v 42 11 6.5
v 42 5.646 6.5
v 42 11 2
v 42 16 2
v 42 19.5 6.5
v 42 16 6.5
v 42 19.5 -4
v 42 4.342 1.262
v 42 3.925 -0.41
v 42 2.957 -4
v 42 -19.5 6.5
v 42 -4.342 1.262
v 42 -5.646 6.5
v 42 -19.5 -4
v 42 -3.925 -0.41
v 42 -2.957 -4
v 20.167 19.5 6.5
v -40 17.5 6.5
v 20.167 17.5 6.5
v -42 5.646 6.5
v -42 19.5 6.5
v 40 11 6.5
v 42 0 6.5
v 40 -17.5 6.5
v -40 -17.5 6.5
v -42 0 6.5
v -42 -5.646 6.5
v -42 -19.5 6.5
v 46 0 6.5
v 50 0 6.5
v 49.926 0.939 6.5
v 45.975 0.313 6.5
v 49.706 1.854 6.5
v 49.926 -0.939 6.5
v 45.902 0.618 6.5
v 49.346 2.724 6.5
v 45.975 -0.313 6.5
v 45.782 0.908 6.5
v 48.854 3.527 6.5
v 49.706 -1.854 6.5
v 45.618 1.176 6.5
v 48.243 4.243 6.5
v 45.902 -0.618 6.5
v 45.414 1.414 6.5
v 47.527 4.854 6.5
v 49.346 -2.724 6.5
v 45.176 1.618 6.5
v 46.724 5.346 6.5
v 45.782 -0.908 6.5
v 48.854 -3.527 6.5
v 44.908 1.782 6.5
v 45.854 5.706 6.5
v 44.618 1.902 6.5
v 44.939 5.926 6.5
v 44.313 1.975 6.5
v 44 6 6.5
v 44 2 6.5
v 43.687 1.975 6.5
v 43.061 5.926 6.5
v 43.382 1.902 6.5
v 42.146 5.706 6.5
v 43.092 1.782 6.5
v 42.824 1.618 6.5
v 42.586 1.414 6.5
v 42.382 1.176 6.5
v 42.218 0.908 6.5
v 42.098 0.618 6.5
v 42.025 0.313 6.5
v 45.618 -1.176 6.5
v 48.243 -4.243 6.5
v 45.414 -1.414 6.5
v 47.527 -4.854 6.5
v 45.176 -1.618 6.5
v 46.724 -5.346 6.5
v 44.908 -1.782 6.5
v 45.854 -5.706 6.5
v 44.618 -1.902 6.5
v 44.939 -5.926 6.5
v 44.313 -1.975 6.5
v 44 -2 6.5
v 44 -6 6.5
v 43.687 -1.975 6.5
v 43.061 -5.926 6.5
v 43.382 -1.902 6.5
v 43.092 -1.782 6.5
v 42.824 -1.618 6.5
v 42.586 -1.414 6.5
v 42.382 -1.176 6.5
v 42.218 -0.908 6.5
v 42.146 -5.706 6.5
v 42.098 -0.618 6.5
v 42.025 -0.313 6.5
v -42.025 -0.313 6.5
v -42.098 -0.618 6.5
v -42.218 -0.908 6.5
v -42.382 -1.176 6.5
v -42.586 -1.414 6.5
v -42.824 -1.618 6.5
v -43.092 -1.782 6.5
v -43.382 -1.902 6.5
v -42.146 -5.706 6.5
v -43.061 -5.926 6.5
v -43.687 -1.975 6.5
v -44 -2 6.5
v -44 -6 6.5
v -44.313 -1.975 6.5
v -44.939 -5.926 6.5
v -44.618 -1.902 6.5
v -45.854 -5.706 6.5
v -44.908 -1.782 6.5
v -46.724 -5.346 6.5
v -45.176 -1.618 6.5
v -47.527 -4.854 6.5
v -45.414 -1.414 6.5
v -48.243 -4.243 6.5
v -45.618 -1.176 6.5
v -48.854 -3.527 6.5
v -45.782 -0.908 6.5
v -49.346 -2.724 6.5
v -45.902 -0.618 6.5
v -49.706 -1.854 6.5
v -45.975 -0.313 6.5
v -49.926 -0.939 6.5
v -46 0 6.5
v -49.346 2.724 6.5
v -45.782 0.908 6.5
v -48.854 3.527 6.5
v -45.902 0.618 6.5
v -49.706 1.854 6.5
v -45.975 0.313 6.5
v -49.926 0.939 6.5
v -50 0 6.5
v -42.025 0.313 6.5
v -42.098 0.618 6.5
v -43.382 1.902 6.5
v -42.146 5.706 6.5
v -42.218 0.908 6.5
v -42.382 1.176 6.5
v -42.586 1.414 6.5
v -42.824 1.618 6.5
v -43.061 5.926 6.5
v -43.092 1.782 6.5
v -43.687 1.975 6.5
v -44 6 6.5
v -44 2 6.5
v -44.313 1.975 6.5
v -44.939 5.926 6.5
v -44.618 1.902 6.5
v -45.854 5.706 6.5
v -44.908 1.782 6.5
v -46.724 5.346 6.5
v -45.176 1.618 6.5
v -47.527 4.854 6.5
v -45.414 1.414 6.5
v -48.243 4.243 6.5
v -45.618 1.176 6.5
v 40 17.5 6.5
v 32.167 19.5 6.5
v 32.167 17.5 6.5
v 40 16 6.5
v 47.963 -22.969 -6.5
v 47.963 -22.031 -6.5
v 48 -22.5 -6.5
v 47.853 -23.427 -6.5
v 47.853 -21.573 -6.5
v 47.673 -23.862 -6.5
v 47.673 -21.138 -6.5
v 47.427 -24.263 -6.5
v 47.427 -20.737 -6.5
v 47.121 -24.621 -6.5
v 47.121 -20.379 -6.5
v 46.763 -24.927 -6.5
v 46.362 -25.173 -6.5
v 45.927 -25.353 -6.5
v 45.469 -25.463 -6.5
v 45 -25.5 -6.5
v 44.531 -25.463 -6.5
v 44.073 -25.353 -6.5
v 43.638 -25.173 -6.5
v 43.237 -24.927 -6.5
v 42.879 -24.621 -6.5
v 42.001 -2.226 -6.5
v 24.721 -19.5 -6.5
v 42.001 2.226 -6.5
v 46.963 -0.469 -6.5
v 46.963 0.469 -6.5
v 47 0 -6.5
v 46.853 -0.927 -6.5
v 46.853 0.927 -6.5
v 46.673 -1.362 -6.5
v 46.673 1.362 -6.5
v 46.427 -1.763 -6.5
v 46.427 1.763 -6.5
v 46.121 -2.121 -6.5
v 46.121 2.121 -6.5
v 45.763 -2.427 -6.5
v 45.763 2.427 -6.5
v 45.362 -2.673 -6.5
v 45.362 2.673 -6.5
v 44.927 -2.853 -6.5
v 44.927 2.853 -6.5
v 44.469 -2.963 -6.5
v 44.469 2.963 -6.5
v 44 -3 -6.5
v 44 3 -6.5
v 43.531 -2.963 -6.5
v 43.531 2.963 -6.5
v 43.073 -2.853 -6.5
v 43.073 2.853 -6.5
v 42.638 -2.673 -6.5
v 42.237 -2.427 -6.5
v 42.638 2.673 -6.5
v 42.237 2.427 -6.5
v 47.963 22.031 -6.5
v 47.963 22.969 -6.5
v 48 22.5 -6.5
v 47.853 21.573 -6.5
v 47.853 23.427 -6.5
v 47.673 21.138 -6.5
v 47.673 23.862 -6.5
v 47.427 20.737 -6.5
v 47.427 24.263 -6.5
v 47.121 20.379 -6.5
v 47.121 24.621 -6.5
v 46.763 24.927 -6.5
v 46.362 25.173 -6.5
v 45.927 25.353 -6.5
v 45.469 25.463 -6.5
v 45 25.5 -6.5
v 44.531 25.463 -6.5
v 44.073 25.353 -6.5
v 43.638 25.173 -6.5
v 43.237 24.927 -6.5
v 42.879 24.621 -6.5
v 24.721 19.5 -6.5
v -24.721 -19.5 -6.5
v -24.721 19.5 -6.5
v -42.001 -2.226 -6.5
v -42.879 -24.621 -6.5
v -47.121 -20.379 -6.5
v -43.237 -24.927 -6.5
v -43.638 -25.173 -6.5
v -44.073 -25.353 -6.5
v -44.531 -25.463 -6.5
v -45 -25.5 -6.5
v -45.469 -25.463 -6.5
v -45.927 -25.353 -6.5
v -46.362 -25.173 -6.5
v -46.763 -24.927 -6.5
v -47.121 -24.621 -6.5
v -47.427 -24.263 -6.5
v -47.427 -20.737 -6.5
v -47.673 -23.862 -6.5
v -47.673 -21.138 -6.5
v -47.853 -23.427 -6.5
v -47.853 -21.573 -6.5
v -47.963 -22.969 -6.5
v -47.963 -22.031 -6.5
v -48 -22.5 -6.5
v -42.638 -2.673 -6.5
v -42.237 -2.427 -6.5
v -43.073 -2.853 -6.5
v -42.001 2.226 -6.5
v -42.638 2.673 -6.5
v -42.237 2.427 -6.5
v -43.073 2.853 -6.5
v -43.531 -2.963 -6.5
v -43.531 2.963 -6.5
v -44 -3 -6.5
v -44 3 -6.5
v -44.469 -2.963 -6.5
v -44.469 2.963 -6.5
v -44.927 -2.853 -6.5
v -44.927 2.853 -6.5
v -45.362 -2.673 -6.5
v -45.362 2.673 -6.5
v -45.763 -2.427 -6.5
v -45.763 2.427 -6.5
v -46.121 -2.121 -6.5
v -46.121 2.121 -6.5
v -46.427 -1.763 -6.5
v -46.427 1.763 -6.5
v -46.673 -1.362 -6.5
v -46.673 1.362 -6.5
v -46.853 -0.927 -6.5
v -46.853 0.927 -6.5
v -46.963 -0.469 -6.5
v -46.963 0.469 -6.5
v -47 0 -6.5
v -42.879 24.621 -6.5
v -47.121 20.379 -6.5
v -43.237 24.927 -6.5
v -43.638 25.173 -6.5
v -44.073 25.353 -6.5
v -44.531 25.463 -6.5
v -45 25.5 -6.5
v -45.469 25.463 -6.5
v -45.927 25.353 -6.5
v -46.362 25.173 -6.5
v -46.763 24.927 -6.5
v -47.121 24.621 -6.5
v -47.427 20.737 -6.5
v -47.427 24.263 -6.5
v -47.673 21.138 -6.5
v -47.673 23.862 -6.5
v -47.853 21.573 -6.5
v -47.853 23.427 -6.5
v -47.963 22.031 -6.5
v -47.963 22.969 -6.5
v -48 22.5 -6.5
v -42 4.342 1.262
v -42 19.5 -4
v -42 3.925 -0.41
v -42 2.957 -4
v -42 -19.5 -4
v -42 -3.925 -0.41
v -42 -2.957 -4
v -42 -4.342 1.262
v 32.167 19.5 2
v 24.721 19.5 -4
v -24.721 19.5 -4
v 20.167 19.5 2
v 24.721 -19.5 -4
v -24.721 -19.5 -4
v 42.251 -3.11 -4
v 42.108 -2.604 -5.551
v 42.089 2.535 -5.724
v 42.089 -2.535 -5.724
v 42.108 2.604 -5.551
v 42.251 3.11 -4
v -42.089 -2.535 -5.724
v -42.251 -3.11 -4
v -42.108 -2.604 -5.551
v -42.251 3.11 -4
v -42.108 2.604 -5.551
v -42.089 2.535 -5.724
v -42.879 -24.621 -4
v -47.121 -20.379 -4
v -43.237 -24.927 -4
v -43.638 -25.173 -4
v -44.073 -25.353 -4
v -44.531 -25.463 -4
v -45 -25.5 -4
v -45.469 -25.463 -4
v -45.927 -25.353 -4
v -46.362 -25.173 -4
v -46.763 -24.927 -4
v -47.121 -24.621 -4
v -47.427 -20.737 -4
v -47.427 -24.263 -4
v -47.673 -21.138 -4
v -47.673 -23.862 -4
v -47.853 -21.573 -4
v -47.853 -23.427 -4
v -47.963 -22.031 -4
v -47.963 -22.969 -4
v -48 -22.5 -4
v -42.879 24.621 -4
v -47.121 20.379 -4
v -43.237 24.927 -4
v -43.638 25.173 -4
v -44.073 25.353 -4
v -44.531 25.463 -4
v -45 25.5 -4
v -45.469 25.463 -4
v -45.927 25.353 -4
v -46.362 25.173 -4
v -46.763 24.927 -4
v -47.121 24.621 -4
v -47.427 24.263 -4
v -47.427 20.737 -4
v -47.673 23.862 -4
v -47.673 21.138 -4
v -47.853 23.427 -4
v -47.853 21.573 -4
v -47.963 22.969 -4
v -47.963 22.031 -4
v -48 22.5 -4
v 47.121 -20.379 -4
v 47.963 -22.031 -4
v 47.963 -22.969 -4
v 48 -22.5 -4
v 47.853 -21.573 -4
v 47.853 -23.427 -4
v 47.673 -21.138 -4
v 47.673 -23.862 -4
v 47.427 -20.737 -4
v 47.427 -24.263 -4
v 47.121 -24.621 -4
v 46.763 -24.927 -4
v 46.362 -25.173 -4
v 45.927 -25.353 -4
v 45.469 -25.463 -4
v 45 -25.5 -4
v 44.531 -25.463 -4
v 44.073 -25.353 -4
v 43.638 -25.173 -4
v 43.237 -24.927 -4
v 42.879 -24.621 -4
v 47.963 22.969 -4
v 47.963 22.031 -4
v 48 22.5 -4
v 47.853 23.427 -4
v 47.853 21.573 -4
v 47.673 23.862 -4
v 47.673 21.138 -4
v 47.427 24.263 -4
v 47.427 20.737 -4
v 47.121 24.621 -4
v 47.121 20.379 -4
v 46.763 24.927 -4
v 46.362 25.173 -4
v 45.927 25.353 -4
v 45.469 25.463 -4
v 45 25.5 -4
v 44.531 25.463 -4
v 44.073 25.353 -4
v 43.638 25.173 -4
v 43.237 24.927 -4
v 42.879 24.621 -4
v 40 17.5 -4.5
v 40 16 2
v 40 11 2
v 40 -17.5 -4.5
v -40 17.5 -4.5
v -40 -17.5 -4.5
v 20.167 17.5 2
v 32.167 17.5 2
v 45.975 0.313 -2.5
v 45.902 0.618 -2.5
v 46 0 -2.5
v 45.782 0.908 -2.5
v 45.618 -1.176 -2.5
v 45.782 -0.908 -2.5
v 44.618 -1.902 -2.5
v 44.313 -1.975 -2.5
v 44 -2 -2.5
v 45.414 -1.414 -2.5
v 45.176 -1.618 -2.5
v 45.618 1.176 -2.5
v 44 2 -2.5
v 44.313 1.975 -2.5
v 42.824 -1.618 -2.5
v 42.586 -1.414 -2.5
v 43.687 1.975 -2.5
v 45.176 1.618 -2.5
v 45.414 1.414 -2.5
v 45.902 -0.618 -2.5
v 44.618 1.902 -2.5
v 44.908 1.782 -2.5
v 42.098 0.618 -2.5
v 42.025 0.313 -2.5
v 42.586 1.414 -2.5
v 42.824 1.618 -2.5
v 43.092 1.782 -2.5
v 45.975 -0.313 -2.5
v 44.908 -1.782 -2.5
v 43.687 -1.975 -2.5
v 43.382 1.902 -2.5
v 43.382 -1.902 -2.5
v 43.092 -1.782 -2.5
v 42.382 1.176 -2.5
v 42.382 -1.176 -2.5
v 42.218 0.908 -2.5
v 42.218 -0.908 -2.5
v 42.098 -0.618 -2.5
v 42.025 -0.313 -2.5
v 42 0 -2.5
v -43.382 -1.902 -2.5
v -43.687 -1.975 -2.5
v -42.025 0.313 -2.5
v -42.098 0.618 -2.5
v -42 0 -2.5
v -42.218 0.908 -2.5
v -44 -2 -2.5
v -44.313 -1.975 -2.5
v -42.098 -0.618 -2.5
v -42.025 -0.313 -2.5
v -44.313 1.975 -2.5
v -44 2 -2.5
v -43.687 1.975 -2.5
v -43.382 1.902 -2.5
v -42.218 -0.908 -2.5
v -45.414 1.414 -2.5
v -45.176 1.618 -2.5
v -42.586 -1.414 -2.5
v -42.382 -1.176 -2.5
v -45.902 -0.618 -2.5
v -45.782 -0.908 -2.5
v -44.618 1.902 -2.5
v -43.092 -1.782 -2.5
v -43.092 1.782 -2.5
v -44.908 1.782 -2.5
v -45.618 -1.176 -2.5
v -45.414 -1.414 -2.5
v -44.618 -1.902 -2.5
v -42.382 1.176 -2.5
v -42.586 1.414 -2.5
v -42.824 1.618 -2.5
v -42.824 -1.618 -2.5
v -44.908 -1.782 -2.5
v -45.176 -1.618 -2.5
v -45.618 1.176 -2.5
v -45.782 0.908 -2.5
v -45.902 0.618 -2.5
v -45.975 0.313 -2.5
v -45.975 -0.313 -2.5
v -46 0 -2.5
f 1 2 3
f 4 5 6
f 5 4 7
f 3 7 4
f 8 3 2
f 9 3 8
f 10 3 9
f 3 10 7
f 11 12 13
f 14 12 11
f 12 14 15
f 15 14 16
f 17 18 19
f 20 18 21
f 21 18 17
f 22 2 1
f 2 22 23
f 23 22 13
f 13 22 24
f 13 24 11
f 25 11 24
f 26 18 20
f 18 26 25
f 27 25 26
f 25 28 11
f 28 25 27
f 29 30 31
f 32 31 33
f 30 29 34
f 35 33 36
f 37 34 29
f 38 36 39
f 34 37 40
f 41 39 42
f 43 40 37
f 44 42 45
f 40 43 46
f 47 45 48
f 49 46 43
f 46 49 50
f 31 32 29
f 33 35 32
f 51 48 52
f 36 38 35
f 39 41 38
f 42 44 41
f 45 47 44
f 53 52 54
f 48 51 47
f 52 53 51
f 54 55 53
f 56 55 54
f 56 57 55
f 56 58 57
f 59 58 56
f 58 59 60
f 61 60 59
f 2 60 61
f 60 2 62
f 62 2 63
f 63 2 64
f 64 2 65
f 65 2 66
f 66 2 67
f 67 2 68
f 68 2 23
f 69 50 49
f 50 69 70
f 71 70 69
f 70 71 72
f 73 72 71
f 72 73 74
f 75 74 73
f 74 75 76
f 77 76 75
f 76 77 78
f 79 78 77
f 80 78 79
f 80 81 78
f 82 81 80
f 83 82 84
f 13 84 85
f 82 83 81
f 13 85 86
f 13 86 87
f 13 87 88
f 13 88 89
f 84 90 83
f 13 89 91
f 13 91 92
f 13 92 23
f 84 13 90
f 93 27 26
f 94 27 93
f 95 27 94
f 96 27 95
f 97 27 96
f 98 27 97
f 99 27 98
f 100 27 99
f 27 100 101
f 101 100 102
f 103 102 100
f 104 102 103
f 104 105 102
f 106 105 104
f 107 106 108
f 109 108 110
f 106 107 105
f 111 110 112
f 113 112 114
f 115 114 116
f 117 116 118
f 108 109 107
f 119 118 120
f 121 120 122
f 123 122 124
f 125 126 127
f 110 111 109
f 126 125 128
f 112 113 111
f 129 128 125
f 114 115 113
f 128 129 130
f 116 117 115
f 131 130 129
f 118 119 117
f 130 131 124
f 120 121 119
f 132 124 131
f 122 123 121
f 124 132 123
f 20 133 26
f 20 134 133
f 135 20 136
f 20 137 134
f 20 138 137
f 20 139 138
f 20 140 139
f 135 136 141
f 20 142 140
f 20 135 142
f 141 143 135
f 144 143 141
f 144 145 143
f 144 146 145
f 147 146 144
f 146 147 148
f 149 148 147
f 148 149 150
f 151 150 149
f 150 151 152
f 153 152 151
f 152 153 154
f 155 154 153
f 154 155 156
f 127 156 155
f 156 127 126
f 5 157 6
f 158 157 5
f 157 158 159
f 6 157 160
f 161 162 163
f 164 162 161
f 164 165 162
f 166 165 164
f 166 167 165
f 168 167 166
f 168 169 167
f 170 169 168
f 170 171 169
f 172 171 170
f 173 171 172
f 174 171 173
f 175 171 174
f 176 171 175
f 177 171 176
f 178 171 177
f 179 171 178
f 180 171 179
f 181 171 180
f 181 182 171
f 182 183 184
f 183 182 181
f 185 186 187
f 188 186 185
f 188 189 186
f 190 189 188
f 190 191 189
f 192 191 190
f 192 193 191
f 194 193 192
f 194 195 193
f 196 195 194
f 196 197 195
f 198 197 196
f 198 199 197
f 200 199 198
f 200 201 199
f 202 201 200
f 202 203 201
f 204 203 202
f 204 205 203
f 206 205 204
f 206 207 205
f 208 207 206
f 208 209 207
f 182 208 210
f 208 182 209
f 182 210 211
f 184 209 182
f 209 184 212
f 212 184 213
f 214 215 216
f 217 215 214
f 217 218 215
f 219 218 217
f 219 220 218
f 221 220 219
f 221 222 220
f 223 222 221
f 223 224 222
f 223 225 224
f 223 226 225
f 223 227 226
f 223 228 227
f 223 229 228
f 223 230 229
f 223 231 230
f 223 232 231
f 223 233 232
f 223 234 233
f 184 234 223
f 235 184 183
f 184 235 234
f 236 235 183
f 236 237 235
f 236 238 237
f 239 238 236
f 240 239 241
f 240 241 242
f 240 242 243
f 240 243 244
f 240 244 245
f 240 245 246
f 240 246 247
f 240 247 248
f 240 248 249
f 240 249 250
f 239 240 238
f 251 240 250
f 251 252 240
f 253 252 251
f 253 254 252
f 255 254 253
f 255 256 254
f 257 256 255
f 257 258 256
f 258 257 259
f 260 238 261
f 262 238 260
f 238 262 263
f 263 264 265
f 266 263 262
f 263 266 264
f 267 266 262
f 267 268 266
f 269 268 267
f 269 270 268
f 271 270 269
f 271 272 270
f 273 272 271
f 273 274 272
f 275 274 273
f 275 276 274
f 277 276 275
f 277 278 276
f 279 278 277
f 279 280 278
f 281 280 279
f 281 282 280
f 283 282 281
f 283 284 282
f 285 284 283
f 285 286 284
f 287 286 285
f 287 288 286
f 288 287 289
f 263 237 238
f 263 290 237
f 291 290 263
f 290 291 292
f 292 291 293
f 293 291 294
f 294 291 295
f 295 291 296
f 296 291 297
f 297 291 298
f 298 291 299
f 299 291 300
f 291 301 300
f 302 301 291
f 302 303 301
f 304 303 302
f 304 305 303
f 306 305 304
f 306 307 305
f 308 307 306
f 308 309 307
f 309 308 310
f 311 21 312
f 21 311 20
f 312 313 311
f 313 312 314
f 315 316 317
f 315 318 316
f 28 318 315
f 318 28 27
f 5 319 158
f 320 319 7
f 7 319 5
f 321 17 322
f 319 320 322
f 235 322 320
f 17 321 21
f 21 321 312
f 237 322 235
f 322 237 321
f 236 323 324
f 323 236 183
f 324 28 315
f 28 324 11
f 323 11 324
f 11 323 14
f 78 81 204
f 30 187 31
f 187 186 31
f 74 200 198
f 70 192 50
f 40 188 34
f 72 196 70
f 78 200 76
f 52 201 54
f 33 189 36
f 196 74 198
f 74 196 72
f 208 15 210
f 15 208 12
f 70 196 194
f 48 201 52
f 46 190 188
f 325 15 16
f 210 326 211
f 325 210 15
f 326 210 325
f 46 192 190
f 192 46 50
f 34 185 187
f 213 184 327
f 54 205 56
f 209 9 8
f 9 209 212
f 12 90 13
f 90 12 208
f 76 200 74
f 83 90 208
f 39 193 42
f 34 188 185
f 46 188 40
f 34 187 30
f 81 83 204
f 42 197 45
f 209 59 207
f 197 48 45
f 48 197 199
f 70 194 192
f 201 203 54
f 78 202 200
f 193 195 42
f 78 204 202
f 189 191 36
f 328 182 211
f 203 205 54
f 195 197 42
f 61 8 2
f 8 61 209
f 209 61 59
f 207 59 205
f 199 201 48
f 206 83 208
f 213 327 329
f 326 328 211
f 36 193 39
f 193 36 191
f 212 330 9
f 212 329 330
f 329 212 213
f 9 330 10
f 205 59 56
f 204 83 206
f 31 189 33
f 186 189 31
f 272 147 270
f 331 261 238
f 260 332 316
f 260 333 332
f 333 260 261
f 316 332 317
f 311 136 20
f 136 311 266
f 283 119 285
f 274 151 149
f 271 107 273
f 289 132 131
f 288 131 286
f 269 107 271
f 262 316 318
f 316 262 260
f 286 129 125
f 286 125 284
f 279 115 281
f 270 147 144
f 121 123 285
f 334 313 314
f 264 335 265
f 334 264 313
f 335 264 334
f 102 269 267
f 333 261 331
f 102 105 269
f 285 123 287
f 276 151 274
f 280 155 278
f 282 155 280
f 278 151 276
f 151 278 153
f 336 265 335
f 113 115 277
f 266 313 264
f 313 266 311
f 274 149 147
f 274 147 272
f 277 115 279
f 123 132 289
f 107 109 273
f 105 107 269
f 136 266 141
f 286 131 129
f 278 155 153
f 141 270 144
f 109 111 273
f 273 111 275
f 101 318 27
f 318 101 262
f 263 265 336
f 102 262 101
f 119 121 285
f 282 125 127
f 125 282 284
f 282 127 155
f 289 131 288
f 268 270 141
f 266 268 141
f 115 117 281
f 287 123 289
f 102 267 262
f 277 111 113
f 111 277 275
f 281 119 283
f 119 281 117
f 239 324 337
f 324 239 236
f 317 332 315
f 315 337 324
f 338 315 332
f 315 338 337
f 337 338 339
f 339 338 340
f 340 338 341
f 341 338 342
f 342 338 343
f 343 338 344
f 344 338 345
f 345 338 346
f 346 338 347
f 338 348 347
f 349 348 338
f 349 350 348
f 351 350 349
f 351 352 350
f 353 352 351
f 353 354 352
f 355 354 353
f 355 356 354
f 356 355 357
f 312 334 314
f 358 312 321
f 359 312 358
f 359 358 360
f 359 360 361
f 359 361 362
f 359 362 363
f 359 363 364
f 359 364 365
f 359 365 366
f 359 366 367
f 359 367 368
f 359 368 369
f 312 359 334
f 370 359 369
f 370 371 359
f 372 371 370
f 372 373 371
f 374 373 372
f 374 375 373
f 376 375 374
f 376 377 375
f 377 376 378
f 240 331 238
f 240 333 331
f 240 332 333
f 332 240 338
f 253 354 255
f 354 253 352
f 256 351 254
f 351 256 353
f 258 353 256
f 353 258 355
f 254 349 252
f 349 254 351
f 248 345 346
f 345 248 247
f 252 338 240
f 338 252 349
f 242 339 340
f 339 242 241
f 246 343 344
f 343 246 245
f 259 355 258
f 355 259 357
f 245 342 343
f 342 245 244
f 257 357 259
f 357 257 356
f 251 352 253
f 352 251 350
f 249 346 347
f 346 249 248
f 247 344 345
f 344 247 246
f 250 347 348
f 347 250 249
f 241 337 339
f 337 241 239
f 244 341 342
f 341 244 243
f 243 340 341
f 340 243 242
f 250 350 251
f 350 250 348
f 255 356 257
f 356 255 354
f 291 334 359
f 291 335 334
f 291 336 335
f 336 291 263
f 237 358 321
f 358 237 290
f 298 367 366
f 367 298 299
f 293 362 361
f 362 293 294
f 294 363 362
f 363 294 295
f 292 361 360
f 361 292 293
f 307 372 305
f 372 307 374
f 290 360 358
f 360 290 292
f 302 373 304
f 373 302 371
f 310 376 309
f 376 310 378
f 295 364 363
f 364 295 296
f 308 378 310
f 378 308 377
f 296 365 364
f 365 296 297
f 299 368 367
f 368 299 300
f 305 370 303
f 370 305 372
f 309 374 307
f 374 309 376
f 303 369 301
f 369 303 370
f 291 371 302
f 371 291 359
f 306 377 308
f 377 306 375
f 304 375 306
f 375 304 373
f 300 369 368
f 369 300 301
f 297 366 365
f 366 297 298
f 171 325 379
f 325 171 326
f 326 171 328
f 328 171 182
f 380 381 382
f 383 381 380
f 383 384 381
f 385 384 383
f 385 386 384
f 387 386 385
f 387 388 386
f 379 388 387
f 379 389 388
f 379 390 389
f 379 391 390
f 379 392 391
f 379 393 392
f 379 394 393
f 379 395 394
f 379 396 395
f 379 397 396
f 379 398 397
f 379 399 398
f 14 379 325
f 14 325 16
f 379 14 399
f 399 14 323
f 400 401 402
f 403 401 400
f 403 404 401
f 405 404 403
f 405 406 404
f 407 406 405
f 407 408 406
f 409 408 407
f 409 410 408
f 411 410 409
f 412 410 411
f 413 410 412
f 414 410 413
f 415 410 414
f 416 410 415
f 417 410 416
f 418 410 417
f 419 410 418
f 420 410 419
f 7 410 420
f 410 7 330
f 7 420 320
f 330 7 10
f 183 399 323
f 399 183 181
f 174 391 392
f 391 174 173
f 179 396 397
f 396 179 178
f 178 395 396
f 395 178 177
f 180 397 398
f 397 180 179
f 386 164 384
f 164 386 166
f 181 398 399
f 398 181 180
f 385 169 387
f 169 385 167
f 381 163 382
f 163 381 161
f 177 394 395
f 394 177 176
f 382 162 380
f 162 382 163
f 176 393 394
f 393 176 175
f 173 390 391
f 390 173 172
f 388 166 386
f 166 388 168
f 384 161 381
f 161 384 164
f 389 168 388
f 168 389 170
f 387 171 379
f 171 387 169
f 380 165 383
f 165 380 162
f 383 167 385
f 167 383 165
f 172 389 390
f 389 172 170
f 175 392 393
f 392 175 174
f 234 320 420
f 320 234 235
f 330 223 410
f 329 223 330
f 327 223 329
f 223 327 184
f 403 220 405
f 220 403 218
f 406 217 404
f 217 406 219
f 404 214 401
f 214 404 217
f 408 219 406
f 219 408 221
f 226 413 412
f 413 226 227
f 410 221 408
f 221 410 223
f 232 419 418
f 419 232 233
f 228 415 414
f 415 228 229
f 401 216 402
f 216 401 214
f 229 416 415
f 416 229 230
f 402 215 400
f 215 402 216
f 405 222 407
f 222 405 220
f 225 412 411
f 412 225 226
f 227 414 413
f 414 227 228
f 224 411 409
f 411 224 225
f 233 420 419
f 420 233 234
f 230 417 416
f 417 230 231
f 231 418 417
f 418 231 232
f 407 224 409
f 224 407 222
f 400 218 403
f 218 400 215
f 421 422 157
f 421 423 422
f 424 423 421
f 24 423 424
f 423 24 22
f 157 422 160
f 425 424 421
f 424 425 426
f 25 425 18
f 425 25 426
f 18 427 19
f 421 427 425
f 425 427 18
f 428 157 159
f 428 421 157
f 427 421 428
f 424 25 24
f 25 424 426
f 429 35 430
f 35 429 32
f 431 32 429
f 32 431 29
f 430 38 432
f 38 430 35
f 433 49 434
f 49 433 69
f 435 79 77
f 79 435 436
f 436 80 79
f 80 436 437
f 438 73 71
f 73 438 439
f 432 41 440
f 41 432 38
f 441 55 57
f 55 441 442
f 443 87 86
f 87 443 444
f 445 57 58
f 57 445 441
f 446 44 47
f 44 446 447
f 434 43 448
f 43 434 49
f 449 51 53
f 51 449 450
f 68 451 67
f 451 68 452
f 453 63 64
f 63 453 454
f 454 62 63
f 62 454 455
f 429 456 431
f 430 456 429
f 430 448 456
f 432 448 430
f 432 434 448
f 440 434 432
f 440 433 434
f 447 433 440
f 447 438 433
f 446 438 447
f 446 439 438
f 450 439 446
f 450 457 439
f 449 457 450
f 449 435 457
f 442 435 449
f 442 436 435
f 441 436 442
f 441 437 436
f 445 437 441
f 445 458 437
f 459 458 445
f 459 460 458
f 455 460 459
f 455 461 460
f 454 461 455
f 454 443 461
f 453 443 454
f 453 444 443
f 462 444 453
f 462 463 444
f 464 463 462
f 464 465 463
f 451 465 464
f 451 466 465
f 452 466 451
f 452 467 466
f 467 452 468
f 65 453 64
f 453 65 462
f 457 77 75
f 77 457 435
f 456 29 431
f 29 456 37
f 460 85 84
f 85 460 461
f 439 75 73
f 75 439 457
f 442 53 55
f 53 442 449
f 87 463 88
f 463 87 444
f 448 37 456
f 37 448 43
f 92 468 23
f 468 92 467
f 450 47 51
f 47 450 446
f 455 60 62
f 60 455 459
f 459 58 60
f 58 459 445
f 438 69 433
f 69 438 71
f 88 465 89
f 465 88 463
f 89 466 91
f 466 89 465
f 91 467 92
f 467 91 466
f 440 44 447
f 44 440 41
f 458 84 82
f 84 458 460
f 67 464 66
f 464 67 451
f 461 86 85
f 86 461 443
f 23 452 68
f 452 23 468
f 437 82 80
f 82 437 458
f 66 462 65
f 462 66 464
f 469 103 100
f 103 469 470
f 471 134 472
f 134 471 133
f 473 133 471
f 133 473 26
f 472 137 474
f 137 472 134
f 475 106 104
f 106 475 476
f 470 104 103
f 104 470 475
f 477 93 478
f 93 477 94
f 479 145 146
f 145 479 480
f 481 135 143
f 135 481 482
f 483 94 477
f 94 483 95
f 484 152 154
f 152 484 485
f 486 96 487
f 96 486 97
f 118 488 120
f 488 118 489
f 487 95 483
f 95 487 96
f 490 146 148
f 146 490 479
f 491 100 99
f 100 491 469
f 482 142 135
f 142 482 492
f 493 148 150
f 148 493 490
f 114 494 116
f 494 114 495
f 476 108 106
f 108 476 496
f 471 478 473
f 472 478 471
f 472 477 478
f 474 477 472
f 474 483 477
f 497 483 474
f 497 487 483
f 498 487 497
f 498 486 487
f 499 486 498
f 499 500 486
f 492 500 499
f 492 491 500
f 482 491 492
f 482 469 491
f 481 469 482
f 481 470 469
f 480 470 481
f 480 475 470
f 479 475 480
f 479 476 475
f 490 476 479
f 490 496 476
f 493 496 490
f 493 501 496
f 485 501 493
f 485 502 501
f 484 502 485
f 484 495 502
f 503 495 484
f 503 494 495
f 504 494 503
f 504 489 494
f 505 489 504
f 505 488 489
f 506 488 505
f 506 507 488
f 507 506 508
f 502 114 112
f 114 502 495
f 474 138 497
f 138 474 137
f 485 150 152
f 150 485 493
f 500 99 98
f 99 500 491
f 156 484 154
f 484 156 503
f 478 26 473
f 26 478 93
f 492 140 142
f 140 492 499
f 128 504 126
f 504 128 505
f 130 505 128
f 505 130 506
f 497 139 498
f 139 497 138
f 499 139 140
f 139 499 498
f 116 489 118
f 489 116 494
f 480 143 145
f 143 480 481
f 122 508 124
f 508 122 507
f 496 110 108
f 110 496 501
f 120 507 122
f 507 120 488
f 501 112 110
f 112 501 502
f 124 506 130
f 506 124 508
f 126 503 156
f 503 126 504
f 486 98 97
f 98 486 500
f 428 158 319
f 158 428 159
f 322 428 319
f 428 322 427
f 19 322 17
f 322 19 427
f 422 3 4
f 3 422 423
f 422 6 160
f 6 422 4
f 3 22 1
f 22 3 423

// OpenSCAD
sizeX = 84;  
sizeY = 39;  

border = 2;
border2 = 2 * border;

height = 13;

picotHeight = 10;
picotStartZ = (height / 2) - 4;

picotR = 2.0;
footHole = 1.5;

offsetCutOutCenterX = (sizeX - border2) / 6 + 2.5; // not evenly centered usb port
offsetCutOutCenterZ = border + 5;

footHeight = 2.5;

y1 = -3;
y2 = 3;
yy1 = -14.2;
yy2 = 14.2;
x1 = 0;
x2 = 20;
z1 = -footHeight / 2;
z2 = -z1;

angle = 45;
offset = 3;
offsetZ = -(height - footHeight) / 2;

useFeet = true;
useFeetHoles = false;
// will cause problems when 3d printing (overhang...)
useFeetRubberHoles = false;

footRubberHoleHeight = 2;
footRubberHoleRadius = 5;

useSecondUsb = false;

CubePoints = [
  [  x1,  y1,  z1 ],  //0
  [ x2,  yy1,  z1 ],  //1
  [ x2,  yy2,  z1 ],  //2
  [  x1,  y2,  z1 ],  //3
  [  x1,  y1,  z2 ],  //4
  [ x2,  yy1,  z2 ],  //5
  [ x2,  yy2,  z2 ],  //6
  [  x1,  y2,  z2 ]]; //7
  
CubeFaces = [
  [0,1,2,3],  // bottom
  [4,5,1,0],  // front
  [7,6,5,4],  // top
  [5,6,2,1],  // right
  [6,7,3,2],  // back
  [7,4,0,3]]; // left

module foot() {  
    color("lightgreen")
    difference() {
        union() {
            polyhedron( CubePoints, CubeFaces );
            cylinder(h = footHeight, r = 3.0, $fn = 40, center = true);
        }
        {
            if (useFeetHoles)
                cylinder(h = footHeight + 2, r = footHole, $fn = 40, center = true);
            if (useFeetRubberHoles)
                translate([0, 0, -2])
                cylinder(h = footRubberHoleHeight, 
                         r = footRubberHoleRadius, 
                         $fn = 40, 
                         center = true);
        }
    }
}

difference() {
    union() {
     color("lightblue") {
       // box
        cube(size=[sizeX, sizeY, height], center = true);
        
        translate([sizeX / 2 + 2, 0, 0])
                cylinder(h = height, r1 = 3, r2 = 6, $fn = 40, center = true);
         translate([-(sizeX / 2 + 2), 0, 0])
                cylinder(h = height, r1 = 3, r2 = 6, $fn = 40, center = true);
     }
  //      translate([sizeX / 2, 0, 0])
  //          cube(size = [6, 12, height], center = true);
  //      translate([-sizeX / 2, 0, 0])
  //          cube(size = [6, 12, height], center = true);
        
    // feet
    if (useFeet) { 
        translate([-((sizeX / 2) + offset), -((sizeY / 2) + offset), offsetZ]) 
            rotate([0, 0, angle]) foot();
        translate([-((sizeX / 2) + offset), ((sizeY / 2) + offset), offsetZ])  
            rotate([0, 0, -angle]) foot();
        translate([((sizeX / 2) + offset), -((sizeY / 2) + offset), offsetZ])  
            rotate([0, 0, 180 - angle]) foot();
        translate([((sizeX / 2) + offset), ((sizeY / 2) + offset), offsetZ])  
            rotate([0, 0, 180 + angle]) foot();
    }  
    }
    {
        // inside
        translate([0, 0, border])
        cube(size=[sizeX - border2, sizeY - border2, height], center = true); 
        
        // hole 1
        #translate([sizeX / 2 + 2, 0, picotStartZ])
          cylinder(h = picotHeight, r = picotR, $fn = 40, center = true);
        
        // hole 2
        #translate([-(sizeX / 2 + 2), 0, picotStartZ])
          cylinder(h = picotHeight, r = picotR, $fn = 40, center = true);
        
        // usb cutout
        translate([(sizeX / 2) - offsetCutOutCenterX, (sizeY / 2), offsetCutOutCenterZ])
          cube(size=[12, 10, 10], center = true);
        
        // reset button
        translate([(sizeX / 2), (sizeY / 2) - 6, offsetCutOutCenterZ])
          cube(size=[5, 5, 10], center = true);
        
        if (useSecondUsb) {
            // usb cutout 2
            #translate([-(sizeX / 2) + offsetCutOutCenterX, -(sizeY / 2), offsetCutOutCenterZ])
                cube(size=[10, 10, 10], center = true);
        
        // reset button 2
        #translate([-(sizeX / 2), -(sizeY / 2) + 6, offsetCutOutCenterZ])
          cube(size=[5, 5, 10], center = true);
 
        }

    }
   
}
